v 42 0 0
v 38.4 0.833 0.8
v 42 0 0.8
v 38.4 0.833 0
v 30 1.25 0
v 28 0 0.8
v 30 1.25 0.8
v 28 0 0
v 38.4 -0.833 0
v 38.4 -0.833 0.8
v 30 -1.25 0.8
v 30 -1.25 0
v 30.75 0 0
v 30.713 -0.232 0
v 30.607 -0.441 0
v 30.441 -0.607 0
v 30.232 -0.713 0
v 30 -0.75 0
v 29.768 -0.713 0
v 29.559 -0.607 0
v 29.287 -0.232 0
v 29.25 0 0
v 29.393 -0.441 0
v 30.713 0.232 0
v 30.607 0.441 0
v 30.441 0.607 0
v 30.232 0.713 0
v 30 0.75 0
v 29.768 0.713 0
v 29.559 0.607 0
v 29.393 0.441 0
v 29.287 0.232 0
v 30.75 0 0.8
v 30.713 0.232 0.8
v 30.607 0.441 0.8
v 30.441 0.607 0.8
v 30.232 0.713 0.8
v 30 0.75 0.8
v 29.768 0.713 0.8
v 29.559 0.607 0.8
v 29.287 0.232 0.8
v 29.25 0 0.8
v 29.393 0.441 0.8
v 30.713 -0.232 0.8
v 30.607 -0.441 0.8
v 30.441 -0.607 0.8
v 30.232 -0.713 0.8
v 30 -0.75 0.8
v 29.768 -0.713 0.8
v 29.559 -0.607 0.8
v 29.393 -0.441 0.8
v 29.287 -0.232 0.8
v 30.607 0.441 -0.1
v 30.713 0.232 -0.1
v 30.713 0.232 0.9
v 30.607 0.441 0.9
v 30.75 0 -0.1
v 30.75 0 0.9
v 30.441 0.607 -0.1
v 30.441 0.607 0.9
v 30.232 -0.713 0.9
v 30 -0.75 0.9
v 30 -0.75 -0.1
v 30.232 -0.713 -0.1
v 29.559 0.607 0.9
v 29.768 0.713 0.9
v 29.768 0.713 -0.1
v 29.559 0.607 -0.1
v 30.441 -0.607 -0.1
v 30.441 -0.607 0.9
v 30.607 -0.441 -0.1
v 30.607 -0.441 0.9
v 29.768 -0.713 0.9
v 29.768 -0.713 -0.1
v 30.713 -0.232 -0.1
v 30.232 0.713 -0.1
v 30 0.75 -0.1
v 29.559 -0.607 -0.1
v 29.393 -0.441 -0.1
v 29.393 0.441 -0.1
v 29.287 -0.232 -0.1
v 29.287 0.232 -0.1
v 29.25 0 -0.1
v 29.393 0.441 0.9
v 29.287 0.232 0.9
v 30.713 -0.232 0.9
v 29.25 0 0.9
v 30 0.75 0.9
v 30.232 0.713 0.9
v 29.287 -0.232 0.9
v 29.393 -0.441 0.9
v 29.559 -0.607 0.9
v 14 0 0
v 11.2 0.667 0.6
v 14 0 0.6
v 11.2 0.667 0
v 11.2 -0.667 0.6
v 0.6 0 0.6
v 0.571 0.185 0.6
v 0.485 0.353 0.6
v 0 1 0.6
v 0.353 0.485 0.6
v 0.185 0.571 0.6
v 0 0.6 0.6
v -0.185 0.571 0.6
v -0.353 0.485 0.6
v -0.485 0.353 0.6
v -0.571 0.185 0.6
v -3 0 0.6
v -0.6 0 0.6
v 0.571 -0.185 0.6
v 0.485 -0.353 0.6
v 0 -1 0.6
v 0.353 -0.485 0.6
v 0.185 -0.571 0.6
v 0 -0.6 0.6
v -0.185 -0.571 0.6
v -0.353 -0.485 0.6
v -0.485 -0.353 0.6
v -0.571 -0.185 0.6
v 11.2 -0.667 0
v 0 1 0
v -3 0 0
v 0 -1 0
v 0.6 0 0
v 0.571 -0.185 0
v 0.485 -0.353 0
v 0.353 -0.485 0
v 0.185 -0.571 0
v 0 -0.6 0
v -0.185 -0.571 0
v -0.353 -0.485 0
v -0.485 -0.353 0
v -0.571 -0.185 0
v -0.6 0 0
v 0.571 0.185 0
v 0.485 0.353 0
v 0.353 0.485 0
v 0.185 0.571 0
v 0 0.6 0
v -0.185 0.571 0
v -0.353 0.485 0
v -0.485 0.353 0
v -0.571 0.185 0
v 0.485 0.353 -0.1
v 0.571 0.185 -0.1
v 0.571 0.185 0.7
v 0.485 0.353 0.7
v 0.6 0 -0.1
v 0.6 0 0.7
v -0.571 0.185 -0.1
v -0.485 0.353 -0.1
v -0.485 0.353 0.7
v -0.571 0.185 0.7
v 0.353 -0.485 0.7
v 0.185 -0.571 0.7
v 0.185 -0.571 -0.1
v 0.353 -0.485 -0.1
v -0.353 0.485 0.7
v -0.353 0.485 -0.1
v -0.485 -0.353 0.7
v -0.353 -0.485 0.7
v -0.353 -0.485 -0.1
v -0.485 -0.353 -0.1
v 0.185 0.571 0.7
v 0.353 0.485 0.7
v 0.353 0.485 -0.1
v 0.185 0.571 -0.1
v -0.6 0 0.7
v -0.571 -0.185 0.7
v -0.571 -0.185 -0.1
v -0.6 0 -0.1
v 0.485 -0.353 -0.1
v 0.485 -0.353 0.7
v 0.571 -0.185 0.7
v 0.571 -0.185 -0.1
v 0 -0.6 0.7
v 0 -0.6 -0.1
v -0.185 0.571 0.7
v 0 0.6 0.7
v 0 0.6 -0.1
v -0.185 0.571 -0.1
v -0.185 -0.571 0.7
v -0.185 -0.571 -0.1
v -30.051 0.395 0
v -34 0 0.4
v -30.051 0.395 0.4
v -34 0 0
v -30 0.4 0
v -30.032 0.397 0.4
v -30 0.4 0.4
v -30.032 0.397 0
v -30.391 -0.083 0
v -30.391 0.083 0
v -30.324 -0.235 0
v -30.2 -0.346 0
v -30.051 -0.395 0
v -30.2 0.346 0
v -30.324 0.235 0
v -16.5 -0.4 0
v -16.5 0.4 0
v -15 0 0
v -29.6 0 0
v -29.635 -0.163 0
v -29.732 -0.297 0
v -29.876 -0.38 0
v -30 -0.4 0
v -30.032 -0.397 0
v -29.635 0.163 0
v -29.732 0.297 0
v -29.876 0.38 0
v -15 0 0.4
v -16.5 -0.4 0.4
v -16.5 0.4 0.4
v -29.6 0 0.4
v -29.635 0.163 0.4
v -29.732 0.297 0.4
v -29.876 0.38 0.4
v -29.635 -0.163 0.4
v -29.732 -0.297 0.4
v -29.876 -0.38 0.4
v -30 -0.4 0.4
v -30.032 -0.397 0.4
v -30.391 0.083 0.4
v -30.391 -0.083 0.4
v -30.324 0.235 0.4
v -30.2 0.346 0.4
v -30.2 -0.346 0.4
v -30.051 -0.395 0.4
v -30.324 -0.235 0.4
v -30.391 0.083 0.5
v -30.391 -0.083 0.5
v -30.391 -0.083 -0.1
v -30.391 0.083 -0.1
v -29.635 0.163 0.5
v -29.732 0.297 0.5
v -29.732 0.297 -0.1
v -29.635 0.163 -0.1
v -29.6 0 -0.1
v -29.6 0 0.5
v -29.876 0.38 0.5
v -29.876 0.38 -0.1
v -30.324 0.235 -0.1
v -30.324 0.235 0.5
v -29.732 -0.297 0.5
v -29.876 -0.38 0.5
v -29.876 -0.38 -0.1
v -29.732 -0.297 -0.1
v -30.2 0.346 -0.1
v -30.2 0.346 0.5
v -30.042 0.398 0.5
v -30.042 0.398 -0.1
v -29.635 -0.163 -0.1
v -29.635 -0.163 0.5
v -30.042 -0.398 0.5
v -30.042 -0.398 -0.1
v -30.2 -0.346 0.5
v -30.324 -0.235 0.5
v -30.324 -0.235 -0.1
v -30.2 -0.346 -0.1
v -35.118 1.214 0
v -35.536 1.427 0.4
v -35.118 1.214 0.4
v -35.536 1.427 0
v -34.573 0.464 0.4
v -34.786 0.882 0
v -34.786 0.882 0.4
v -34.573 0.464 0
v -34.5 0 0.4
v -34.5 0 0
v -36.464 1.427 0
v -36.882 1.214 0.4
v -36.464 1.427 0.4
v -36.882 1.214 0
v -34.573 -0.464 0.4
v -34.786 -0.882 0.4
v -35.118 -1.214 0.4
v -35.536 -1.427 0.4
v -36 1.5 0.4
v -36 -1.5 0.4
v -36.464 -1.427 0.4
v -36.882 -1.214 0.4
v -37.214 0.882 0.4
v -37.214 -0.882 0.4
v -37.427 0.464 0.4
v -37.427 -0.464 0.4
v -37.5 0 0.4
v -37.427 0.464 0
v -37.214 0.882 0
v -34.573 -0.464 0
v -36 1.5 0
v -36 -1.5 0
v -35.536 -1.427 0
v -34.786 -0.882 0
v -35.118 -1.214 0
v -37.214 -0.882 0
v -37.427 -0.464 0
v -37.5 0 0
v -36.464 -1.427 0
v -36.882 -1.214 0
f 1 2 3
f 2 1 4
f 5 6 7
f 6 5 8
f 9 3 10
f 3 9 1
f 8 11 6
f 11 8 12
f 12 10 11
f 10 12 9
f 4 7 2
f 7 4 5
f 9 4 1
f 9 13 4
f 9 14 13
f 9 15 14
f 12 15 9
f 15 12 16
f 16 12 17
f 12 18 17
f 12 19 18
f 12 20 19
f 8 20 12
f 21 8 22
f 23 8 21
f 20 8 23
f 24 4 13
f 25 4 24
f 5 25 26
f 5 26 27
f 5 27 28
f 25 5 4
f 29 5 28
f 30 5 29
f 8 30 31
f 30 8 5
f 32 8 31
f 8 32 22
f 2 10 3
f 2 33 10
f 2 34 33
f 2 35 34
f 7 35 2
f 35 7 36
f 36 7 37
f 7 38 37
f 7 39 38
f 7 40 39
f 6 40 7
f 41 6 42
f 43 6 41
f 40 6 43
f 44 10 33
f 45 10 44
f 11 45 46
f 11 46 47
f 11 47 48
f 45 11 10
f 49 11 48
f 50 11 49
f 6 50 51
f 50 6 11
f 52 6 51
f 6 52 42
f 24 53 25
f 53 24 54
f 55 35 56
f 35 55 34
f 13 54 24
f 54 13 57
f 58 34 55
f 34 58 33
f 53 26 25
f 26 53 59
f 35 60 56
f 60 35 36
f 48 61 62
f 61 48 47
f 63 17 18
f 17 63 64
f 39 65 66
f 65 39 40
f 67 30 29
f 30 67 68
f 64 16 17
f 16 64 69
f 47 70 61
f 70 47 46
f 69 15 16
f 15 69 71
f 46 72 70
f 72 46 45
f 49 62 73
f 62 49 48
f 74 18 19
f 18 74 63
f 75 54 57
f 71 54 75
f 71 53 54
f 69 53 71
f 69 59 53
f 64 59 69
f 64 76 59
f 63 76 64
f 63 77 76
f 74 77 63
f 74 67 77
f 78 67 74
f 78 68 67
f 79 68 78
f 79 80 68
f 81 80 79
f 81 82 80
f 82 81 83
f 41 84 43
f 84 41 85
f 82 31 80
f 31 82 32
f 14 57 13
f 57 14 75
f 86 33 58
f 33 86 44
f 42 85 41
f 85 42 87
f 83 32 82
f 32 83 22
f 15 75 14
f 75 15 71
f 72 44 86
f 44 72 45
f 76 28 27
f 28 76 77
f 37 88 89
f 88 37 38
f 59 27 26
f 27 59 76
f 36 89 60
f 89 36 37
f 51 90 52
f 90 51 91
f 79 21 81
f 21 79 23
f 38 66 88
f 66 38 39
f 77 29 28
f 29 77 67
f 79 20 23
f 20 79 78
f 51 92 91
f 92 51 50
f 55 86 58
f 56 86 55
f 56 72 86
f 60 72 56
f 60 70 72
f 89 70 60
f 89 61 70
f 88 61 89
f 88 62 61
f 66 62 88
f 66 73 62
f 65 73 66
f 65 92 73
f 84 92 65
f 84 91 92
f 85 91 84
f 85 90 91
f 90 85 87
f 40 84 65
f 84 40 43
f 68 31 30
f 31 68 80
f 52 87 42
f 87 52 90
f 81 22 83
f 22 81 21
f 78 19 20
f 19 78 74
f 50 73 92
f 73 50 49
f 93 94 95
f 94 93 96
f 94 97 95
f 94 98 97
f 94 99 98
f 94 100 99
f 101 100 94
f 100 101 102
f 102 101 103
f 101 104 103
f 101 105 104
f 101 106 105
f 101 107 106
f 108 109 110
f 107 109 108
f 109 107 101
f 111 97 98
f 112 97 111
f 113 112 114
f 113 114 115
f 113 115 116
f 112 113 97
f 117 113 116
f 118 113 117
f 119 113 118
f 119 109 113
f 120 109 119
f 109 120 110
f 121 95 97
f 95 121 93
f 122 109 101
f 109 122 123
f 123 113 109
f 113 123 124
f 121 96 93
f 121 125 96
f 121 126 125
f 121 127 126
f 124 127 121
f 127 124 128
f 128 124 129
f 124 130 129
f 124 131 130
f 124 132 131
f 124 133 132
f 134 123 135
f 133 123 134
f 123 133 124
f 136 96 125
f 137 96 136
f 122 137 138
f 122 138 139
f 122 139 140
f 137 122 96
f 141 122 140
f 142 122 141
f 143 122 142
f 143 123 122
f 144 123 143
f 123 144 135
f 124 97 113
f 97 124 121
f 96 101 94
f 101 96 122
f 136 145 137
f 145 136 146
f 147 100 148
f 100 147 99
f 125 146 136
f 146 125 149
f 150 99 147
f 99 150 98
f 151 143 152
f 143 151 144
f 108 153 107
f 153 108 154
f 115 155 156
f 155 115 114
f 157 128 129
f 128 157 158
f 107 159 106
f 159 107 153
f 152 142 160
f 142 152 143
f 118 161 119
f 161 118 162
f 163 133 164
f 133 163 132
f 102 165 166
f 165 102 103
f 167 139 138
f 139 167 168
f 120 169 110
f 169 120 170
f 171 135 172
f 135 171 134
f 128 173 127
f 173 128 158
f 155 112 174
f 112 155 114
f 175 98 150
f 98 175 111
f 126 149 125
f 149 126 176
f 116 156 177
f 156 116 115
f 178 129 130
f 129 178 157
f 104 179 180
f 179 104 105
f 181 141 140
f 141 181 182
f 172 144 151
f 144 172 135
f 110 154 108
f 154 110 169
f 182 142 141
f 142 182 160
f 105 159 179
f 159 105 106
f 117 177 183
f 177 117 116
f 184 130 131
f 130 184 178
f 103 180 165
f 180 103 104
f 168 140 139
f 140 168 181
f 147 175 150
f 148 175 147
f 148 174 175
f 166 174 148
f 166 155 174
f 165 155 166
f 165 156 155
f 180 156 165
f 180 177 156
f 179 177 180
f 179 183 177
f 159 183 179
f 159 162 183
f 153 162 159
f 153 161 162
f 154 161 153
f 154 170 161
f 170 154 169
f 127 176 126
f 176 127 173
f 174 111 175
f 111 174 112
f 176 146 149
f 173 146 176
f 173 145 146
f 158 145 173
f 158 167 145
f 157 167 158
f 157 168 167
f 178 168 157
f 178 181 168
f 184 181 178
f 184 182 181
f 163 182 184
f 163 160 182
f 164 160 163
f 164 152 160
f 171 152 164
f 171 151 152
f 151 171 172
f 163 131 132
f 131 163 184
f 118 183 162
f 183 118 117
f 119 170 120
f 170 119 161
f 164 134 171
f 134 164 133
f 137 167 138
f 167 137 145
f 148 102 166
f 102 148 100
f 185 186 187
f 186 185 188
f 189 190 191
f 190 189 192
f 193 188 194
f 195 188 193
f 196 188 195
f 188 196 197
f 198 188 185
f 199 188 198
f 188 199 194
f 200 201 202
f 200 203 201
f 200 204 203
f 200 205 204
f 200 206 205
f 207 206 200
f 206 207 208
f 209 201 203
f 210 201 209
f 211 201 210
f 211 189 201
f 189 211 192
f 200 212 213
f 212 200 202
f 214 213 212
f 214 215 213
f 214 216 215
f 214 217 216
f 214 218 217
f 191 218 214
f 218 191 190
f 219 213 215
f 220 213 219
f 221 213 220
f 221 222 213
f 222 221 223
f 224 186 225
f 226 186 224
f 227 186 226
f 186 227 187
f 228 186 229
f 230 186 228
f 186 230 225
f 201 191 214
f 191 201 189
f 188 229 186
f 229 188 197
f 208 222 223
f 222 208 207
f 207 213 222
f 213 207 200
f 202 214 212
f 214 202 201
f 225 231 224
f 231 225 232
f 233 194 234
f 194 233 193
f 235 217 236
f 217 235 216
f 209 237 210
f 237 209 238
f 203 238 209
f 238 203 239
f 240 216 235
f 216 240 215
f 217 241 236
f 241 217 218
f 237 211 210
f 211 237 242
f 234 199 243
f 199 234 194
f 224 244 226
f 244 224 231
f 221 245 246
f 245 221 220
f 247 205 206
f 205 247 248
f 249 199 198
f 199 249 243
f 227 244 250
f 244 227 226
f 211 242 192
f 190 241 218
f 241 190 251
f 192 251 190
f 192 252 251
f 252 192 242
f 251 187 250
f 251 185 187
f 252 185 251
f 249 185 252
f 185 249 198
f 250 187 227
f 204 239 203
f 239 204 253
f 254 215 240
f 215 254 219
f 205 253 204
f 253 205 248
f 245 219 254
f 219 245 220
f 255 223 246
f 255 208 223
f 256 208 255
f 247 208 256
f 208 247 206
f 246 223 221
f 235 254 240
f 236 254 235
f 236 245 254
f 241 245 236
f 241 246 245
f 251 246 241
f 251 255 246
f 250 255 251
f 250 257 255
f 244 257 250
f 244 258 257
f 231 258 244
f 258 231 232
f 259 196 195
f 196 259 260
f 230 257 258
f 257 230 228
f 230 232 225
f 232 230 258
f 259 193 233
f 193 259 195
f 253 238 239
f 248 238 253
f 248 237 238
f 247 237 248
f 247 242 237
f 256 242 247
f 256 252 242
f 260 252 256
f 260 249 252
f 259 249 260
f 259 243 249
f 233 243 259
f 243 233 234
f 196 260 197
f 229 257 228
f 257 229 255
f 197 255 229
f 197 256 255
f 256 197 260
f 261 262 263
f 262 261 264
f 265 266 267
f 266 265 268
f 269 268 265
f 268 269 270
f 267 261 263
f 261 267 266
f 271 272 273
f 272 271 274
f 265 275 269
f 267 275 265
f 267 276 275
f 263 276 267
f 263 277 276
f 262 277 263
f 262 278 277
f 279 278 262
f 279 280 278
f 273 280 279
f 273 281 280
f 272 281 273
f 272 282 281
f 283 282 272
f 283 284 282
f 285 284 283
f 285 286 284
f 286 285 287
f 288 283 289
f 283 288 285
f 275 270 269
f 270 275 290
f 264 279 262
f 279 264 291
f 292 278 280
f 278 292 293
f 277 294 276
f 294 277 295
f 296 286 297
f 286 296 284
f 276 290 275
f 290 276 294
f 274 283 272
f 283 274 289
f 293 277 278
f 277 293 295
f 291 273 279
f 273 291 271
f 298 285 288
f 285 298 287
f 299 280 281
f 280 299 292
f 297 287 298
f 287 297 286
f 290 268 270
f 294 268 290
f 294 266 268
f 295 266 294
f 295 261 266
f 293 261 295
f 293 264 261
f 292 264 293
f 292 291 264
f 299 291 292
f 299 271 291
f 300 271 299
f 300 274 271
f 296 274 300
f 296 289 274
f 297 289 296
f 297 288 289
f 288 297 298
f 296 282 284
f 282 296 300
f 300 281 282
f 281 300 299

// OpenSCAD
// Open Source Watch Hands Template

// Configuration
hand_style = "sword";
hour_length = 12.0;
minute_length = 14.0;
second_length = 15.0;
include_second = true;

module watch_hands() {
    // Hour hand
    translate([30, 0, 0]) hour_hand();
    
    // Minute hand  
    translate([0, 0, 0]) minute_hand();
    
    // Second hand
    translate([-30, 0, 0]) second_hand();
}

module hour_hand() {
    hand_thickness = 0.8;
    hand_width = 2.5;
    
    linear_extrude(height=hand_thickness) {
        polygon(points=[
            [0, -hand_width/2],
            [hour_length * 0.7, -hand_width/3],
            [hour_length, 0],
            [hour_length * 0.7, hand_width/3],
            [0, hand_width/2],
            [-2, 0]
        ]);
    }
    
    // Center hole
    translate([0, 0, -0.1])
        cylinder(h=hand_thickness + 0.2, d=1.5, $fn=20);
}

module minute_hand() {
    hand_thickness = 0.6;
    hand_width = 2.0;
    
    linear_extrude(height=hand_thickness) {
        polygon(points=[
            [0, -hand_width/2],
            [minute_length * 0.8, -hand_width/3],
            [minute_length, 0],
            [minute_length * 0.8, hand_width/3],
            [0, hand_width/2],
            [-3, 0]
        ]);
    }
    
    // Center hole
    translate([0, 0, -0.1])
        cylinder(h=hand_thickness + 0.2, d=1.2, $fn=20);
}

module second_hand() {
    hand_thickness = 0.4;
    hand_width = 0.8;
    
    // Main hand body
    linear_extrude(height=hand_thickness) {
        polygon(points=[
            [0, -hand_width/2],
            [second_length * 0.9, -hand_width/2],
            [second_length, 0],
            [second_length * 0.9, hand_width/2],
            [0, hand_width/2],
            [-4, 0]
        ]);
    }
    
    // Center hole
    translate([0, 0, -0.1])
        cylinder(h=hand_thickness + 0.2, d=0.8, $fn=15);
        
    // Balance weight
    translate([-6, 0, 0])
        cylinder(h=hand_thickness, d=3, $fn=20);
}

// Generate all hands
watch_hands();
